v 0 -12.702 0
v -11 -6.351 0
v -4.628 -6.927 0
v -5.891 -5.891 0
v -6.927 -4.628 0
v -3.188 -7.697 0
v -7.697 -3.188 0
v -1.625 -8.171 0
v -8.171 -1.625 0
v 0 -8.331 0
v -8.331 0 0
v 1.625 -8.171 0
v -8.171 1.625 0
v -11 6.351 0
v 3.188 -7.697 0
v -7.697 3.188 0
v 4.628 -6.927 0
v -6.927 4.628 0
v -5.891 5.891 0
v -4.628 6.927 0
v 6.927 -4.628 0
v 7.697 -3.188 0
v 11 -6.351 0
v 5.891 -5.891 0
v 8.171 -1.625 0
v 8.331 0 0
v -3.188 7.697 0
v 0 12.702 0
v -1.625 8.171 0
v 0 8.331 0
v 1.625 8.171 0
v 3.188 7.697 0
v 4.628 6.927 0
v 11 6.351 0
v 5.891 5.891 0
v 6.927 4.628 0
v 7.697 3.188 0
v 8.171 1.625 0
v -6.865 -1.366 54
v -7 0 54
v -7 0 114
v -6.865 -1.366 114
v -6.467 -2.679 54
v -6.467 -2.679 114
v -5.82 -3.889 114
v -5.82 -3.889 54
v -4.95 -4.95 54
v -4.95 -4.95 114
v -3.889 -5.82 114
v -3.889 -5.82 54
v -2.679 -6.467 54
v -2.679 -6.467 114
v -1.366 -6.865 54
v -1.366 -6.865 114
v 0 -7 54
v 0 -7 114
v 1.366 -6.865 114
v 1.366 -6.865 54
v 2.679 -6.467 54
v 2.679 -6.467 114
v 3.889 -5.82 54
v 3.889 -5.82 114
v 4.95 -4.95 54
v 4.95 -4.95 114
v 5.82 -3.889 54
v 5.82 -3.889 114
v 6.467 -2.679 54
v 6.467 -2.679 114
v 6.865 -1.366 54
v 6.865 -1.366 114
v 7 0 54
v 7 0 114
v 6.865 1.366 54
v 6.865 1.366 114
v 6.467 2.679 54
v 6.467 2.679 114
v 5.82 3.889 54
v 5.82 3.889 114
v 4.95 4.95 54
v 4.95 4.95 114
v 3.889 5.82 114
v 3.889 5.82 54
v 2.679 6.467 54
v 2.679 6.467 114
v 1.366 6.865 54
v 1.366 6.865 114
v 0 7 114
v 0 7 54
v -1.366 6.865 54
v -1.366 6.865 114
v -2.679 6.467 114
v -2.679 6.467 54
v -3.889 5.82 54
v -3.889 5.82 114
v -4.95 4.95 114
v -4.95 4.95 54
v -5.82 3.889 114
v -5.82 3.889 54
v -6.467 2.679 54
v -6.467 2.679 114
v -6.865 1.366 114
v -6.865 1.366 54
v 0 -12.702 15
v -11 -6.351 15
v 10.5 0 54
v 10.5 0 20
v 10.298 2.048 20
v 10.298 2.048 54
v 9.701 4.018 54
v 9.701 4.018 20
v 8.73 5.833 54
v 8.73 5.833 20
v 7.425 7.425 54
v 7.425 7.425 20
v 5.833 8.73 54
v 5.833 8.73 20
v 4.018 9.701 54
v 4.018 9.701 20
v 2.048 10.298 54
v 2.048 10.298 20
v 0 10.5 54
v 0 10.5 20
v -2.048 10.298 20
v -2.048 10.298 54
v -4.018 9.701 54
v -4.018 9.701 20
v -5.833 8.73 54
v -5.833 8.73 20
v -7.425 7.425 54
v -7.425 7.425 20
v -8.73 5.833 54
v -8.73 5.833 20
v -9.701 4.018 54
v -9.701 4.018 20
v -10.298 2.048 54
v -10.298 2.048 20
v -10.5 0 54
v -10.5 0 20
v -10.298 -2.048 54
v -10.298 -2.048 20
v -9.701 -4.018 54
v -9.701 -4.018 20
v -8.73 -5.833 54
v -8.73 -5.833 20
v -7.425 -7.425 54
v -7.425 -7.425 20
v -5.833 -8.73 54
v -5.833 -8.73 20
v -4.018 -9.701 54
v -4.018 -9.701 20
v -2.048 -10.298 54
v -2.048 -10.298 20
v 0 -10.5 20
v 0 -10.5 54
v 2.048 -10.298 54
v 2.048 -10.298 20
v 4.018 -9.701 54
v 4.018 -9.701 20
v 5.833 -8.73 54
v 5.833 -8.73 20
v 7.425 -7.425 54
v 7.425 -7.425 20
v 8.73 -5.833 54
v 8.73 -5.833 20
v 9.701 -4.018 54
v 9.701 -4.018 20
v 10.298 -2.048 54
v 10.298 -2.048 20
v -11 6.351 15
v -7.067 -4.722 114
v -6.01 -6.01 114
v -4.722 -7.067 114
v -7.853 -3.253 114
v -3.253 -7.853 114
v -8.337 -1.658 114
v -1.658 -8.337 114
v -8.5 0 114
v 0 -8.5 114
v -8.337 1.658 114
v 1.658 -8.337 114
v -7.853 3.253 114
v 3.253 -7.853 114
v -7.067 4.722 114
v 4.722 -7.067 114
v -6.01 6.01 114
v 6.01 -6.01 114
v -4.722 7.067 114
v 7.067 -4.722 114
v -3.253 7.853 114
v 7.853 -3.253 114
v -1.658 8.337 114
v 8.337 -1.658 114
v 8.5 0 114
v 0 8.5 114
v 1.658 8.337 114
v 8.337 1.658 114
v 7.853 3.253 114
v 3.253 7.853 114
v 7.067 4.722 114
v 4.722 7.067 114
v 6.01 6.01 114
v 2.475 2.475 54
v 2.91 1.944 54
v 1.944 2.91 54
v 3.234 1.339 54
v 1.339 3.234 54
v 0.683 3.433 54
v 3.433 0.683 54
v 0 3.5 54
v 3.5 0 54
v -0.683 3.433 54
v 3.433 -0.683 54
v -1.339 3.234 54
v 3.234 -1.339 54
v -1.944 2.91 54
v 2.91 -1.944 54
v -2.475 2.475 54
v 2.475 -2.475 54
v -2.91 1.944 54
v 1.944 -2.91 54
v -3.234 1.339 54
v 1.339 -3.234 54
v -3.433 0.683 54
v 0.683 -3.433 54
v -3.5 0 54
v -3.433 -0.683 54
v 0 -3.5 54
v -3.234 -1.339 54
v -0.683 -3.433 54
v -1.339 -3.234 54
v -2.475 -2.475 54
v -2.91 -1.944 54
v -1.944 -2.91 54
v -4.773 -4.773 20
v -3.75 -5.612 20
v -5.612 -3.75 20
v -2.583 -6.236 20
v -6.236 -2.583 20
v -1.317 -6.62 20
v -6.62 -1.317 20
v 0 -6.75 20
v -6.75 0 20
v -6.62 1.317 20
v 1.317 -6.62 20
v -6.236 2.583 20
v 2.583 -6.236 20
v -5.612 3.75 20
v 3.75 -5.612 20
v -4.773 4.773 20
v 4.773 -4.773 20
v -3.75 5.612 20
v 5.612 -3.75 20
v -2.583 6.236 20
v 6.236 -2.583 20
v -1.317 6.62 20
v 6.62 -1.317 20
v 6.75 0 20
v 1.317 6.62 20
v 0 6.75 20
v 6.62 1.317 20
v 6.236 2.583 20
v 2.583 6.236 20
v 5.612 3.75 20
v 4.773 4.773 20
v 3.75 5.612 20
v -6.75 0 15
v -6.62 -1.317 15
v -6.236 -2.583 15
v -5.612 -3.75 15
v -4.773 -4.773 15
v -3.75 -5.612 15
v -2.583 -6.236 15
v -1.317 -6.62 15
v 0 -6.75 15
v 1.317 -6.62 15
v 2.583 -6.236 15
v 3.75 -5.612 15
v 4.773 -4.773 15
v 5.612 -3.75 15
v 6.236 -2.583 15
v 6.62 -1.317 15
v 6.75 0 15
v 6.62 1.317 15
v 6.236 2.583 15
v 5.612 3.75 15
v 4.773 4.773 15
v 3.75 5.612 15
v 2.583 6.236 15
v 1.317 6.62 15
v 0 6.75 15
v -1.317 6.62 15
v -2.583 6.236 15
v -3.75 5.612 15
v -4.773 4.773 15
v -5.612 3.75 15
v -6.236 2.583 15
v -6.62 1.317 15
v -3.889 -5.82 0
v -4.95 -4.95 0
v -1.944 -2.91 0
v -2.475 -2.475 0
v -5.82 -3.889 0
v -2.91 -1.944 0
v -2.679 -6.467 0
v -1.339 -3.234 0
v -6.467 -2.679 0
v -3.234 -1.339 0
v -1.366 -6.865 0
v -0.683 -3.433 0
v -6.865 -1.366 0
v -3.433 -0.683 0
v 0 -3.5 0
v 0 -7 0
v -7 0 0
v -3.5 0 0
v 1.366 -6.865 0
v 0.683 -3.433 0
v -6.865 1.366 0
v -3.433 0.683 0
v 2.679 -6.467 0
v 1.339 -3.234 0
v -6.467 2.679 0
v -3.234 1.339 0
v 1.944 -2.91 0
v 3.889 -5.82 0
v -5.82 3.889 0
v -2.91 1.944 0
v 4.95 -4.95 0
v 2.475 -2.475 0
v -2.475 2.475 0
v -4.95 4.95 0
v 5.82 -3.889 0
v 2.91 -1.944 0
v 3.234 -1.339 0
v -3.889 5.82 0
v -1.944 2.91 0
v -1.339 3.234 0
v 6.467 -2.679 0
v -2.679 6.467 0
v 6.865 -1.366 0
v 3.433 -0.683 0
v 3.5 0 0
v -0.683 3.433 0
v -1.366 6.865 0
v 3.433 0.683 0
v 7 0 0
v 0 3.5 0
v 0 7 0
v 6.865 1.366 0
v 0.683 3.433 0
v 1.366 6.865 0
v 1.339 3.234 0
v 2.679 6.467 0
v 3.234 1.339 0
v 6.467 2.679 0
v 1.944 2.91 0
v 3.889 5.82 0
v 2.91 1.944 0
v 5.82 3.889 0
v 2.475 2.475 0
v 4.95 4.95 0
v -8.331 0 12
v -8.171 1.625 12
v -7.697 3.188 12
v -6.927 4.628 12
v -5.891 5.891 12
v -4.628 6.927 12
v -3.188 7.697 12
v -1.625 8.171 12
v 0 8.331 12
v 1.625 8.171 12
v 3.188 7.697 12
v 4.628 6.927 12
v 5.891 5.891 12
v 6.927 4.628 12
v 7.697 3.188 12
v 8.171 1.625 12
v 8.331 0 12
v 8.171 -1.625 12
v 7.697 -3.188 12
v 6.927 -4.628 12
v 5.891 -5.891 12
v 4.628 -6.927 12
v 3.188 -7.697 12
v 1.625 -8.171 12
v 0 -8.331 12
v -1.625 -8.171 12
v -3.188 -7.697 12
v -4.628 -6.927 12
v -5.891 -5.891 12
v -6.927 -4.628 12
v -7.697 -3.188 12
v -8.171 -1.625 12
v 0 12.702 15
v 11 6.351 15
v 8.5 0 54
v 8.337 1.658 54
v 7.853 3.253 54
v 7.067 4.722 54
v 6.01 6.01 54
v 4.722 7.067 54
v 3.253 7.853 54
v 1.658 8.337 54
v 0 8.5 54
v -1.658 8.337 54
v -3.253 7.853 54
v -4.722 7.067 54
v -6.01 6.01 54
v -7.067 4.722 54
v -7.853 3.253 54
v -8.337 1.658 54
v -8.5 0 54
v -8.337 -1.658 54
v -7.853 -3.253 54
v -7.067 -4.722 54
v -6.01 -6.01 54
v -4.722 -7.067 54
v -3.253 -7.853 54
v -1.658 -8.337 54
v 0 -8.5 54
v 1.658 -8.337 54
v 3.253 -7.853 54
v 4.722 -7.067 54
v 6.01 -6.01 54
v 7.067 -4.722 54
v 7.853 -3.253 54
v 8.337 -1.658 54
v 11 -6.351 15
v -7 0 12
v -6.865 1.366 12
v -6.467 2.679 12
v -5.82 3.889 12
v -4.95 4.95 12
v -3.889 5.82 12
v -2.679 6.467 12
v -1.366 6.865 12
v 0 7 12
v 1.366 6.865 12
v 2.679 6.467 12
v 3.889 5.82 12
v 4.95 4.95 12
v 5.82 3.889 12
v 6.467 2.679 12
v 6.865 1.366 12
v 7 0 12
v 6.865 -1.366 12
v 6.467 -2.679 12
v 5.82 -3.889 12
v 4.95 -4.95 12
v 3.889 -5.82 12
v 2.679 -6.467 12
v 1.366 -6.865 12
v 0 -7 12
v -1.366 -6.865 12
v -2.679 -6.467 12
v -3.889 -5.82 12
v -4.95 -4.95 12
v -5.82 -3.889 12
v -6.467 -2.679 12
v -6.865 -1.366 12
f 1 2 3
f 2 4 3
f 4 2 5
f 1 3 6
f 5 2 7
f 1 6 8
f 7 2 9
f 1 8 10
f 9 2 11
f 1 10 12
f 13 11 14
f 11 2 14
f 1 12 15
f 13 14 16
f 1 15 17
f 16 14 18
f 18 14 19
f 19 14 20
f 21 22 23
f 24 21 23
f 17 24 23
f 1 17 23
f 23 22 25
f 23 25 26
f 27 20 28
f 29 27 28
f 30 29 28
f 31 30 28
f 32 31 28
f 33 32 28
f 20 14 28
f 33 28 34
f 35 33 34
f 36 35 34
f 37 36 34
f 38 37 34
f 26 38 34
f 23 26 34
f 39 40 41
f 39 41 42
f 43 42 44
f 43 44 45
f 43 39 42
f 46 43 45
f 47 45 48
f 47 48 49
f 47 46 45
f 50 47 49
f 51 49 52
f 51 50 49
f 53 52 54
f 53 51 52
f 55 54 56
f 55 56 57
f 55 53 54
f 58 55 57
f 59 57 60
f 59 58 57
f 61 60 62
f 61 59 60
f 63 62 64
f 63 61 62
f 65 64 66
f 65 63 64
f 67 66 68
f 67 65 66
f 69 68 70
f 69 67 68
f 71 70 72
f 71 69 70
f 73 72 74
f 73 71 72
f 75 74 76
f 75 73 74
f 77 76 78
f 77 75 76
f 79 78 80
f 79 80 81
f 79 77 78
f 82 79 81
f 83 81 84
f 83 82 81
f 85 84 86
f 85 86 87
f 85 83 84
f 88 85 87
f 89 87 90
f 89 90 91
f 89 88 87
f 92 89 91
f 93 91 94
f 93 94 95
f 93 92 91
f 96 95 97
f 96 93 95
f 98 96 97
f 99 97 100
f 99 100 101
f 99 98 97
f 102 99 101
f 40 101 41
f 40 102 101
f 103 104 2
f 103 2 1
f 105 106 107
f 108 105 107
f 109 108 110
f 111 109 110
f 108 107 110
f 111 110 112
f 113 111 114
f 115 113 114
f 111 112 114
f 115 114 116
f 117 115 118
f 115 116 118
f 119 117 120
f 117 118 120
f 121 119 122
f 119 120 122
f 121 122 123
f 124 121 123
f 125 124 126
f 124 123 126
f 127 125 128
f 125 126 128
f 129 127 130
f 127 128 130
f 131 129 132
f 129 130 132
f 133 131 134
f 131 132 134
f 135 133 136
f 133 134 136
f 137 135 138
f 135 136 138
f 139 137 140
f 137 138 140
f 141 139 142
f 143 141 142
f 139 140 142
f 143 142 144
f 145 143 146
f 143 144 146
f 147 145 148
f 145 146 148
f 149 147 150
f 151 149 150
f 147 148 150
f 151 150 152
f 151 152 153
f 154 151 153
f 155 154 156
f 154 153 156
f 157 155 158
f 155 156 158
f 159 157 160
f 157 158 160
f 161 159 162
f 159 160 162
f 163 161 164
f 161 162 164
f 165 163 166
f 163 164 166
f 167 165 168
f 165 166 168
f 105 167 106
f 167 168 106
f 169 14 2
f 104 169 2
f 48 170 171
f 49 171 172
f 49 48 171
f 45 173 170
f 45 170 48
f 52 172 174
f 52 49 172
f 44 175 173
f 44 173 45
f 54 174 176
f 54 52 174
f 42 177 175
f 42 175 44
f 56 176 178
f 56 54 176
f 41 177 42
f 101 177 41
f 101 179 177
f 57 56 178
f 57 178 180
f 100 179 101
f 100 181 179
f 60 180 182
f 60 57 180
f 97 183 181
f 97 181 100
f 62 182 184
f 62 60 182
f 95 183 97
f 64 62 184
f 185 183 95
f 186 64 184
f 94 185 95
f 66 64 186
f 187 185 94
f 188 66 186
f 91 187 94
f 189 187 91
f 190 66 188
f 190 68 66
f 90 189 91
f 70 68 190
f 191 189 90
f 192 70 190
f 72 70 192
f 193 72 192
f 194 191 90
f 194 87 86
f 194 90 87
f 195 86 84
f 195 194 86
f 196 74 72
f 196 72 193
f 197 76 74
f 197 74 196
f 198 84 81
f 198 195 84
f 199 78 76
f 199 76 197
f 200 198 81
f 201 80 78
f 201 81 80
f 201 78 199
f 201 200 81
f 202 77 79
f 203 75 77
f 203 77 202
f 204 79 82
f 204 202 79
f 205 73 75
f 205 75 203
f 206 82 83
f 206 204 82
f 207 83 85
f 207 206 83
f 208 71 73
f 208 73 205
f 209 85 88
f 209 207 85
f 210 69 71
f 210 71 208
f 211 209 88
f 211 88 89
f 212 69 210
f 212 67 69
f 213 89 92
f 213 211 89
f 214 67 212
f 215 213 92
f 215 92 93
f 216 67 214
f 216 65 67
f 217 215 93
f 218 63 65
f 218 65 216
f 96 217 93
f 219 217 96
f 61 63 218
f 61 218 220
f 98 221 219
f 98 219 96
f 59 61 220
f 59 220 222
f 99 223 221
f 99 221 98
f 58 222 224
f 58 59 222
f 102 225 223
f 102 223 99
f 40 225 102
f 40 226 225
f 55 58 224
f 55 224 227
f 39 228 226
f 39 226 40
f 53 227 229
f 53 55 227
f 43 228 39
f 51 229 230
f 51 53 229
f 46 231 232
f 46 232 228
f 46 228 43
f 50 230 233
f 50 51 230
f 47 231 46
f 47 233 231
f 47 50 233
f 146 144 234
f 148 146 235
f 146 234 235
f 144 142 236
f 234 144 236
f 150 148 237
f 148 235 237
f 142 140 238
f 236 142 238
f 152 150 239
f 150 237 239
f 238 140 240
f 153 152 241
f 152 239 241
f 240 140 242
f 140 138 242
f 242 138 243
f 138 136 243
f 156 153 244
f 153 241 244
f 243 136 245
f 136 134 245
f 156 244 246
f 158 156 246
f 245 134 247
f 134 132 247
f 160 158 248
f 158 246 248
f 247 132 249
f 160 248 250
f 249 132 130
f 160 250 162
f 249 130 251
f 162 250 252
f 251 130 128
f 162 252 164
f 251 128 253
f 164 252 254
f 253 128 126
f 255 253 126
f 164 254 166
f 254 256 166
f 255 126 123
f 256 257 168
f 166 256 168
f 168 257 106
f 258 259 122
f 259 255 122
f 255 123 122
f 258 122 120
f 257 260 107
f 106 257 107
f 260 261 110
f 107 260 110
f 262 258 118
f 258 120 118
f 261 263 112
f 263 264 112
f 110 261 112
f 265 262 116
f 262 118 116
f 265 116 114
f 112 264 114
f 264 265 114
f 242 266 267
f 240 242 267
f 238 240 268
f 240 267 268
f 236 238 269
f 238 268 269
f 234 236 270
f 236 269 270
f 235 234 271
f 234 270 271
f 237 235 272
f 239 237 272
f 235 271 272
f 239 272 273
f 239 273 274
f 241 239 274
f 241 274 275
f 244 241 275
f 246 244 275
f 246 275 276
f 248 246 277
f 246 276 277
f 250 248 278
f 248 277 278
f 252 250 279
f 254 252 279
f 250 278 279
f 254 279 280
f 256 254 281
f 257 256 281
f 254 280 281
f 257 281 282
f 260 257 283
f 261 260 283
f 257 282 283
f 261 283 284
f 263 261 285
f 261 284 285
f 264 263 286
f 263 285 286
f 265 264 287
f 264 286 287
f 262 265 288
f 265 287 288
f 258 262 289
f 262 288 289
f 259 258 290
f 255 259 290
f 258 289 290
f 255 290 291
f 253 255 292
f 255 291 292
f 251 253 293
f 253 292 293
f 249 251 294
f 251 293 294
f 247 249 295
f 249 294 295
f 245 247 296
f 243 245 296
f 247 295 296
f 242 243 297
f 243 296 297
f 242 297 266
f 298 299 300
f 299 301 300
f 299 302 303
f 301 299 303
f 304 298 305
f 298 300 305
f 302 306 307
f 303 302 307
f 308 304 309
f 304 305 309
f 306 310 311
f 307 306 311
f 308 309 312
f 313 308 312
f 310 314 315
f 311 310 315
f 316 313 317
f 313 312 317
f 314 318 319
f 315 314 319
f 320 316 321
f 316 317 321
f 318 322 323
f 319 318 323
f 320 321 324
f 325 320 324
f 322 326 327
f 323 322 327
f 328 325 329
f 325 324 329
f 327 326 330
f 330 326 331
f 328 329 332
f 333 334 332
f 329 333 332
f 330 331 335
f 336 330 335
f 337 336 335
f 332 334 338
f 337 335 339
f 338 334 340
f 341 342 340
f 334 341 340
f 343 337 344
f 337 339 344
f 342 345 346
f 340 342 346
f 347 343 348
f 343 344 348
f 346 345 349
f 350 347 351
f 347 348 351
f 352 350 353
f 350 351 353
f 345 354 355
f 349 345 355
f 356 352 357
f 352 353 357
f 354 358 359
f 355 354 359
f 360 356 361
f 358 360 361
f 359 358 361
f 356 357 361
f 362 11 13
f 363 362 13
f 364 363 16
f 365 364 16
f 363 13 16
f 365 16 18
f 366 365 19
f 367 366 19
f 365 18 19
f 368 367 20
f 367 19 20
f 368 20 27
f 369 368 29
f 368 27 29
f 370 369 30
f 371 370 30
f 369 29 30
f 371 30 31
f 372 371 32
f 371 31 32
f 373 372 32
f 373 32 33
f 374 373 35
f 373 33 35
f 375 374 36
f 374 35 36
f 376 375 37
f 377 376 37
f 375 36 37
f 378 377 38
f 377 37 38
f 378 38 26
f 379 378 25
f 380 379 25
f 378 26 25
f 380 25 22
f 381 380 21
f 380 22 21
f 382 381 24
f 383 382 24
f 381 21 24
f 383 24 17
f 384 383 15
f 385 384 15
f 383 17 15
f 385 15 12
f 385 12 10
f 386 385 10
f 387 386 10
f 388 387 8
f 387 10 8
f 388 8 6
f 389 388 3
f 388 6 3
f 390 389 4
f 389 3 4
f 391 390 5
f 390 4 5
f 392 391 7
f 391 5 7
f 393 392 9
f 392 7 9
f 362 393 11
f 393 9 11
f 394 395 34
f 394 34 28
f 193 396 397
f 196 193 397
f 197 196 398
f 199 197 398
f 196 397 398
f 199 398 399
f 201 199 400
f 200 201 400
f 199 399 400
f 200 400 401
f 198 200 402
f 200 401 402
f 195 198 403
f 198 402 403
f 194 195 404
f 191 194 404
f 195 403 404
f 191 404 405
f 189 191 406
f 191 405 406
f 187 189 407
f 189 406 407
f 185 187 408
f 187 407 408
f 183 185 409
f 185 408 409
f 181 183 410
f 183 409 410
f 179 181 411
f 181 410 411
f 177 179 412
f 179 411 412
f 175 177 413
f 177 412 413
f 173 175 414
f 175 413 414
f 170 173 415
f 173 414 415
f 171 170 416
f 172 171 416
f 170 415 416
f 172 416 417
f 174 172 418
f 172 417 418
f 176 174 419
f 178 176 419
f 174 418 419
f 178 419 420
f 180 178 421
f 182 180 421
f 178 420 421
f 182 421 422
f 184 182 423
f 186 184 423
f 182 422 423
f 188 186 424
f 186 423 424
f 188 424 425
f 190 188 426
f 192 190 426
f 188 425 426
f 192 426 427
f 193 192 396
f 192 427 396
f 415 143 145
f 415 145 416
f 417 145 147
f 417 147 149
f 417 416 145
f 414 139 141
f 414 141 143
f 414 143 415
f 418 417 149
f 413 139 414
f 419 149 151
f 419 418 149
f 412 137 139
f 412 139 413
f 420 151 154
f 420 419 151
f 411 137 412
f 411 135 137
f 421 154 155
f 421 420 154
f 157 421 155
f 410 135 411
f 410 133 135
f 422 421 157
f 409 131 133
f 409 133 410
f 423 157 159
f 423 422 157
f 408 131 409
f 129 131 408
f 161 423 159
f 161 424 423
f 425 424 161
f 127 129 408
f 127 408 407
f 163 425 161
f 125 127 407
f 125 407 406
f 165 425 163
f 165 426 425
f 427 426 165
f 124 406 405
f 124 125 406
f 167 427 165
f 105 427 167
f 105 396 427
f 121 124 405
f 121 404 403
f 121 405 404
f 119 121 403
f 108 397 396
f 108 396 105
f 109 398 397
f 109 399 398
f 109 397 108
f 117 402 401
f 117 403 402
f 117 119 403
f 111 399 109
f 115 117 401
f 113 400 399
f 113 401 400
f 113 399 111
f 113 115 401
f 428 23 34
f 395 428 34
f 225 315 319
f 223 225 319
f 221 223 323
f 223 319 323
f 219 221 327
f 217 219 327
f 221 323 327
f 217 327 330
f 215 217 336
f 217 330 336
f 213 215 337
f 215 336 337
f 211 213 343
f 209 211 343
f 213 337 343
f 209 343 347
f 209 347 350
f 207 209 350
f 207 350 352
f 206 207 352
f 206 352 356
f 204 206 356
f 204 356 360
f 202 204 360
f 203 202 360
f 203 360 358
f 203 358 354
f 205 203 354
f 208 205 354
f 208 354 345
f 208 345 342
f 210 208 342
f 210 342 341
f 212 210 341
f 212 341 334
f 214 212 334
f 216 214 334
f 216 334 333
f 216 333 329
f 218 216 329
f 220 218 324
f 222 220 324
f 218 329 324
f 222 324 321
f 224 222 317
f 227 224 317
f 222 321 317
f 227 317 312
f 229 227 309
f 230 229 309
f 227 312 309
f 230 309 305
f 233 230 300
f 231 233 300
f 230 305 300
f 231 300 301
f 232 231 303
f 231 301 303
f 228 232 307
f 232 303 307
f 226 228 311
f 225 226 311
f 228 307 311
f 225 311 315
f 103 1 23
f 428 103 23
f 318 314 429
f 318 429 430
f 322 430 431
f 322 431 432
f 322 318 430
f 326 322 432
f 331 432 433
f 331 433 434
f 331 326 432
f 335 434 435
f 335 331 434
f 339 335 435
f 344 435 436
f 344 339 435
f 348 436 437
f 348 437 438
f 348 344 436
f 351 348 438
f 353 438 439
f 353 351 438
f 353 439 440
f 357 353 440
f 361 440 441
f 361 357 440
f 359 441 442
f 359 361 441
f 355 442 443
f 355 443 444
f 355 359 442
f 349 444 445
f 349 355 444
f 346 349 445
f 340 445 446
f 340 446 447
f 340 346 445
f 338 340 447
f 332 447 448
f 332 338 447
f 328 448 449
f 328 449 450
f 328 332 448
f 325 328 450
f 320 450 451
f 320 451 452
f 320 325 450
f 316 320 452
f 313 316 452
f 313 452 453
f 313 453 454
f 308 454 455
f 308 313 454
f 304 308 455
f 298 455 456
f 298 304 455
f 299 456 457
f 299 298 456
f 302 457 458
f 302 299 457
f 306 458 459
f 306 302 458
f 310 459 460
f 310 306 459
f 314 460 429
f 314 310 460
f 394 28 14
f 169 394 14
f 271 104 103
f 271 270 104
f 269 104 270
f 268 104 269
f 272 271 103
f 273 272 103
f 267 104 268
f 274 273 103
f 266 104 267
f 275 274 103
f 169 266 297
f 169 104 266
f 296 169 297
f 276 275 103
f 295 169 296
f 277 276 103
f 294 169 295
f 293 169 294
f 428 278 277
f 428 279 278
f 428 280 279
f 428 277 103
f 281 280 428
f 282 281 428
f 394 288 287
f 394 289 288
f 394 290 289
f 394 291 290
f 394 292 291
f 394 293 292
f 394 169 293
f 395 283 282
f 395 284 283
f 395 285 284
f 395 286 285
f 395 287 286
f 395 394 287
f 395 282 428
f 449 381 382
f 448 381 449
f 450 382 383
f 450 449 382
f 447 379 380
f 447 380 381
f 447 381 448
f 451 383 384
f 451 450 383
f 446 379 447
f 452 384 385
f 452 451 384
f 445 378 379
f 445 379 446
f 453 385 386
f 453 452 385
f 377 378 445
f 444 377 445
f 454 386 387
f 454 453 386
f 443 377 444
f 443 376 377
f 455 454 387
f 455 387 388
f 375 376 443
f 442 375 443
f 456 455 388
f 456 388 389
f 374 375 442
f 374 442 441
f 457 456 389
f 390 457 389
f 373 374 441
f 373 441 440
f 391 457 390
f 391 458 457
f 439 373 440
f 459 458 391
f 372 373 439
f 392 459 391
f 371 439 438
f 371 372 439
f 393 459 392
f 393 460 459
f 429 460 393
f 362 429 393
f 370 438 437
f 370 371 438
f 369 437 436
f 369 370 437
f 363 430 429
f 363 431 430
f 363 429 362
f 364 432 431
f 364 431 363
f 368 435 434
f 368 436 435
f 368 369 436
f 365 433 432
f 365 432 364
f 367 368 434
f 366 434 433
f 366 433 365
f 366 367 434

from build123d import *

# Parameters (mm, degrees)
BASE_EXTRUDE_DEPTH      = 15
SKETCH2_R               = 8.331
SKETCH2_R_2             = 7
CUT_EXTRUDE1_DEPTH      = 12
SKETCH4_R               = 6.75
BOSS_EXTRUDE1_DEPTH     = 5
BOSS_EXTRUDE2_START     = 20
BOSS_EXTRUDE2_OUTLINE_R = 10.5
BOSS_EXTRUDE2_DEPTH     = 34
SKETCH6_R               = 8.5
BOSS_EXTRUDE3_DEPTH     = 60
CUT_EXTRUDE3_START      = -60
SKETCH7_R               = 7
CUT_EXTRUDE3_DEPTH      = 60
SKETCH3_R               = 3.5
CUT_EXTRUDE2_DEPTH      = 116.231650745


# Read off the part's stored shape, not the designer's step: Boss-Extrude2
with BuildPart() as part:
    # Sketch1 → Base-Extrude (new body)
    with BuildSketch(Plane.XY):
        Polygon((0, 12.701705922), (-11, 6.350852961), (-11, -6.350852961), (0, -12.701705922), (11, -6.350852961), (11, 6.350852961), align=None)
    extrude(amount=BASE_EXTRUDE_DEPTH)

    # Sketch2 → Cut-Extrude1 (cut)
    with BuildSketch(Plane(origin=(0, 0, 0), x_dir=(-1, 0, 0), z_dir=(0, 0, -1))):
        Circle(SKETCH2_R)
        Circle(SKETCH2_R_2, mode=Mode.SUBTRACT)
    extrude(amount=-CUT_EXTRUDE1_DEPTH, mode=Mode.SUBTRACT)

    # Sketch4 → Boss-Extrude1 (add)
    with BuildSketch(Plane.XY.offset(15)):
        with Locations(Location((0, 0, 0), (0, 0, 180))):
            Circle(SKETCH4_R)
    extrude(amount=BOSS_EXTRUDE1_DEPTH)

    # Boss-Extrude2 outline → Boss-Extrude2 (add)
    with BuildSketch(Plane.XY.offset(BOSS_EXTRUDE2_START)):
        Circle(BOSS_EXTRUDE2_OUTLINE_R)
    extrude(amount=BOSS_EXTRUDE2_DEPTH)

    # Sketch6 → Boss-Extrude3 (add)
    with BuildSketch(Plane.XY.offset(54)):
        Circle(SKETCH6_R)
    extrude(amount=BOSS_EXTRUDE3_DEPTH)

    # Sketch7 → Cut-Extrude3 (cut)
    with BuildSketch(Plane.XY.offset(114).offset(CUT_EXTRUDE3_START)):
        with Locations(Location((0, 0, 0), (0, 0, 180))):
            Circle(SKETCH7_R)
    extrude(amount=CUT_EXTRUDE3_DEPTH, mode=Mode.SUBTRACT)

    # Sketch3 → Cut-Extrude2 (cut, through all)
    with BuildSketch(Plane(origin=(0, 0, 0), x_dir=(-1, 0, 0), z_dir=(0, 0, -1))):
        Circle(SKETCH3_R)
    extrude(amount=-CUT_EXTRUDE2_DEPTH, mode=Mode.SUBTRACT)


solid = part.part
